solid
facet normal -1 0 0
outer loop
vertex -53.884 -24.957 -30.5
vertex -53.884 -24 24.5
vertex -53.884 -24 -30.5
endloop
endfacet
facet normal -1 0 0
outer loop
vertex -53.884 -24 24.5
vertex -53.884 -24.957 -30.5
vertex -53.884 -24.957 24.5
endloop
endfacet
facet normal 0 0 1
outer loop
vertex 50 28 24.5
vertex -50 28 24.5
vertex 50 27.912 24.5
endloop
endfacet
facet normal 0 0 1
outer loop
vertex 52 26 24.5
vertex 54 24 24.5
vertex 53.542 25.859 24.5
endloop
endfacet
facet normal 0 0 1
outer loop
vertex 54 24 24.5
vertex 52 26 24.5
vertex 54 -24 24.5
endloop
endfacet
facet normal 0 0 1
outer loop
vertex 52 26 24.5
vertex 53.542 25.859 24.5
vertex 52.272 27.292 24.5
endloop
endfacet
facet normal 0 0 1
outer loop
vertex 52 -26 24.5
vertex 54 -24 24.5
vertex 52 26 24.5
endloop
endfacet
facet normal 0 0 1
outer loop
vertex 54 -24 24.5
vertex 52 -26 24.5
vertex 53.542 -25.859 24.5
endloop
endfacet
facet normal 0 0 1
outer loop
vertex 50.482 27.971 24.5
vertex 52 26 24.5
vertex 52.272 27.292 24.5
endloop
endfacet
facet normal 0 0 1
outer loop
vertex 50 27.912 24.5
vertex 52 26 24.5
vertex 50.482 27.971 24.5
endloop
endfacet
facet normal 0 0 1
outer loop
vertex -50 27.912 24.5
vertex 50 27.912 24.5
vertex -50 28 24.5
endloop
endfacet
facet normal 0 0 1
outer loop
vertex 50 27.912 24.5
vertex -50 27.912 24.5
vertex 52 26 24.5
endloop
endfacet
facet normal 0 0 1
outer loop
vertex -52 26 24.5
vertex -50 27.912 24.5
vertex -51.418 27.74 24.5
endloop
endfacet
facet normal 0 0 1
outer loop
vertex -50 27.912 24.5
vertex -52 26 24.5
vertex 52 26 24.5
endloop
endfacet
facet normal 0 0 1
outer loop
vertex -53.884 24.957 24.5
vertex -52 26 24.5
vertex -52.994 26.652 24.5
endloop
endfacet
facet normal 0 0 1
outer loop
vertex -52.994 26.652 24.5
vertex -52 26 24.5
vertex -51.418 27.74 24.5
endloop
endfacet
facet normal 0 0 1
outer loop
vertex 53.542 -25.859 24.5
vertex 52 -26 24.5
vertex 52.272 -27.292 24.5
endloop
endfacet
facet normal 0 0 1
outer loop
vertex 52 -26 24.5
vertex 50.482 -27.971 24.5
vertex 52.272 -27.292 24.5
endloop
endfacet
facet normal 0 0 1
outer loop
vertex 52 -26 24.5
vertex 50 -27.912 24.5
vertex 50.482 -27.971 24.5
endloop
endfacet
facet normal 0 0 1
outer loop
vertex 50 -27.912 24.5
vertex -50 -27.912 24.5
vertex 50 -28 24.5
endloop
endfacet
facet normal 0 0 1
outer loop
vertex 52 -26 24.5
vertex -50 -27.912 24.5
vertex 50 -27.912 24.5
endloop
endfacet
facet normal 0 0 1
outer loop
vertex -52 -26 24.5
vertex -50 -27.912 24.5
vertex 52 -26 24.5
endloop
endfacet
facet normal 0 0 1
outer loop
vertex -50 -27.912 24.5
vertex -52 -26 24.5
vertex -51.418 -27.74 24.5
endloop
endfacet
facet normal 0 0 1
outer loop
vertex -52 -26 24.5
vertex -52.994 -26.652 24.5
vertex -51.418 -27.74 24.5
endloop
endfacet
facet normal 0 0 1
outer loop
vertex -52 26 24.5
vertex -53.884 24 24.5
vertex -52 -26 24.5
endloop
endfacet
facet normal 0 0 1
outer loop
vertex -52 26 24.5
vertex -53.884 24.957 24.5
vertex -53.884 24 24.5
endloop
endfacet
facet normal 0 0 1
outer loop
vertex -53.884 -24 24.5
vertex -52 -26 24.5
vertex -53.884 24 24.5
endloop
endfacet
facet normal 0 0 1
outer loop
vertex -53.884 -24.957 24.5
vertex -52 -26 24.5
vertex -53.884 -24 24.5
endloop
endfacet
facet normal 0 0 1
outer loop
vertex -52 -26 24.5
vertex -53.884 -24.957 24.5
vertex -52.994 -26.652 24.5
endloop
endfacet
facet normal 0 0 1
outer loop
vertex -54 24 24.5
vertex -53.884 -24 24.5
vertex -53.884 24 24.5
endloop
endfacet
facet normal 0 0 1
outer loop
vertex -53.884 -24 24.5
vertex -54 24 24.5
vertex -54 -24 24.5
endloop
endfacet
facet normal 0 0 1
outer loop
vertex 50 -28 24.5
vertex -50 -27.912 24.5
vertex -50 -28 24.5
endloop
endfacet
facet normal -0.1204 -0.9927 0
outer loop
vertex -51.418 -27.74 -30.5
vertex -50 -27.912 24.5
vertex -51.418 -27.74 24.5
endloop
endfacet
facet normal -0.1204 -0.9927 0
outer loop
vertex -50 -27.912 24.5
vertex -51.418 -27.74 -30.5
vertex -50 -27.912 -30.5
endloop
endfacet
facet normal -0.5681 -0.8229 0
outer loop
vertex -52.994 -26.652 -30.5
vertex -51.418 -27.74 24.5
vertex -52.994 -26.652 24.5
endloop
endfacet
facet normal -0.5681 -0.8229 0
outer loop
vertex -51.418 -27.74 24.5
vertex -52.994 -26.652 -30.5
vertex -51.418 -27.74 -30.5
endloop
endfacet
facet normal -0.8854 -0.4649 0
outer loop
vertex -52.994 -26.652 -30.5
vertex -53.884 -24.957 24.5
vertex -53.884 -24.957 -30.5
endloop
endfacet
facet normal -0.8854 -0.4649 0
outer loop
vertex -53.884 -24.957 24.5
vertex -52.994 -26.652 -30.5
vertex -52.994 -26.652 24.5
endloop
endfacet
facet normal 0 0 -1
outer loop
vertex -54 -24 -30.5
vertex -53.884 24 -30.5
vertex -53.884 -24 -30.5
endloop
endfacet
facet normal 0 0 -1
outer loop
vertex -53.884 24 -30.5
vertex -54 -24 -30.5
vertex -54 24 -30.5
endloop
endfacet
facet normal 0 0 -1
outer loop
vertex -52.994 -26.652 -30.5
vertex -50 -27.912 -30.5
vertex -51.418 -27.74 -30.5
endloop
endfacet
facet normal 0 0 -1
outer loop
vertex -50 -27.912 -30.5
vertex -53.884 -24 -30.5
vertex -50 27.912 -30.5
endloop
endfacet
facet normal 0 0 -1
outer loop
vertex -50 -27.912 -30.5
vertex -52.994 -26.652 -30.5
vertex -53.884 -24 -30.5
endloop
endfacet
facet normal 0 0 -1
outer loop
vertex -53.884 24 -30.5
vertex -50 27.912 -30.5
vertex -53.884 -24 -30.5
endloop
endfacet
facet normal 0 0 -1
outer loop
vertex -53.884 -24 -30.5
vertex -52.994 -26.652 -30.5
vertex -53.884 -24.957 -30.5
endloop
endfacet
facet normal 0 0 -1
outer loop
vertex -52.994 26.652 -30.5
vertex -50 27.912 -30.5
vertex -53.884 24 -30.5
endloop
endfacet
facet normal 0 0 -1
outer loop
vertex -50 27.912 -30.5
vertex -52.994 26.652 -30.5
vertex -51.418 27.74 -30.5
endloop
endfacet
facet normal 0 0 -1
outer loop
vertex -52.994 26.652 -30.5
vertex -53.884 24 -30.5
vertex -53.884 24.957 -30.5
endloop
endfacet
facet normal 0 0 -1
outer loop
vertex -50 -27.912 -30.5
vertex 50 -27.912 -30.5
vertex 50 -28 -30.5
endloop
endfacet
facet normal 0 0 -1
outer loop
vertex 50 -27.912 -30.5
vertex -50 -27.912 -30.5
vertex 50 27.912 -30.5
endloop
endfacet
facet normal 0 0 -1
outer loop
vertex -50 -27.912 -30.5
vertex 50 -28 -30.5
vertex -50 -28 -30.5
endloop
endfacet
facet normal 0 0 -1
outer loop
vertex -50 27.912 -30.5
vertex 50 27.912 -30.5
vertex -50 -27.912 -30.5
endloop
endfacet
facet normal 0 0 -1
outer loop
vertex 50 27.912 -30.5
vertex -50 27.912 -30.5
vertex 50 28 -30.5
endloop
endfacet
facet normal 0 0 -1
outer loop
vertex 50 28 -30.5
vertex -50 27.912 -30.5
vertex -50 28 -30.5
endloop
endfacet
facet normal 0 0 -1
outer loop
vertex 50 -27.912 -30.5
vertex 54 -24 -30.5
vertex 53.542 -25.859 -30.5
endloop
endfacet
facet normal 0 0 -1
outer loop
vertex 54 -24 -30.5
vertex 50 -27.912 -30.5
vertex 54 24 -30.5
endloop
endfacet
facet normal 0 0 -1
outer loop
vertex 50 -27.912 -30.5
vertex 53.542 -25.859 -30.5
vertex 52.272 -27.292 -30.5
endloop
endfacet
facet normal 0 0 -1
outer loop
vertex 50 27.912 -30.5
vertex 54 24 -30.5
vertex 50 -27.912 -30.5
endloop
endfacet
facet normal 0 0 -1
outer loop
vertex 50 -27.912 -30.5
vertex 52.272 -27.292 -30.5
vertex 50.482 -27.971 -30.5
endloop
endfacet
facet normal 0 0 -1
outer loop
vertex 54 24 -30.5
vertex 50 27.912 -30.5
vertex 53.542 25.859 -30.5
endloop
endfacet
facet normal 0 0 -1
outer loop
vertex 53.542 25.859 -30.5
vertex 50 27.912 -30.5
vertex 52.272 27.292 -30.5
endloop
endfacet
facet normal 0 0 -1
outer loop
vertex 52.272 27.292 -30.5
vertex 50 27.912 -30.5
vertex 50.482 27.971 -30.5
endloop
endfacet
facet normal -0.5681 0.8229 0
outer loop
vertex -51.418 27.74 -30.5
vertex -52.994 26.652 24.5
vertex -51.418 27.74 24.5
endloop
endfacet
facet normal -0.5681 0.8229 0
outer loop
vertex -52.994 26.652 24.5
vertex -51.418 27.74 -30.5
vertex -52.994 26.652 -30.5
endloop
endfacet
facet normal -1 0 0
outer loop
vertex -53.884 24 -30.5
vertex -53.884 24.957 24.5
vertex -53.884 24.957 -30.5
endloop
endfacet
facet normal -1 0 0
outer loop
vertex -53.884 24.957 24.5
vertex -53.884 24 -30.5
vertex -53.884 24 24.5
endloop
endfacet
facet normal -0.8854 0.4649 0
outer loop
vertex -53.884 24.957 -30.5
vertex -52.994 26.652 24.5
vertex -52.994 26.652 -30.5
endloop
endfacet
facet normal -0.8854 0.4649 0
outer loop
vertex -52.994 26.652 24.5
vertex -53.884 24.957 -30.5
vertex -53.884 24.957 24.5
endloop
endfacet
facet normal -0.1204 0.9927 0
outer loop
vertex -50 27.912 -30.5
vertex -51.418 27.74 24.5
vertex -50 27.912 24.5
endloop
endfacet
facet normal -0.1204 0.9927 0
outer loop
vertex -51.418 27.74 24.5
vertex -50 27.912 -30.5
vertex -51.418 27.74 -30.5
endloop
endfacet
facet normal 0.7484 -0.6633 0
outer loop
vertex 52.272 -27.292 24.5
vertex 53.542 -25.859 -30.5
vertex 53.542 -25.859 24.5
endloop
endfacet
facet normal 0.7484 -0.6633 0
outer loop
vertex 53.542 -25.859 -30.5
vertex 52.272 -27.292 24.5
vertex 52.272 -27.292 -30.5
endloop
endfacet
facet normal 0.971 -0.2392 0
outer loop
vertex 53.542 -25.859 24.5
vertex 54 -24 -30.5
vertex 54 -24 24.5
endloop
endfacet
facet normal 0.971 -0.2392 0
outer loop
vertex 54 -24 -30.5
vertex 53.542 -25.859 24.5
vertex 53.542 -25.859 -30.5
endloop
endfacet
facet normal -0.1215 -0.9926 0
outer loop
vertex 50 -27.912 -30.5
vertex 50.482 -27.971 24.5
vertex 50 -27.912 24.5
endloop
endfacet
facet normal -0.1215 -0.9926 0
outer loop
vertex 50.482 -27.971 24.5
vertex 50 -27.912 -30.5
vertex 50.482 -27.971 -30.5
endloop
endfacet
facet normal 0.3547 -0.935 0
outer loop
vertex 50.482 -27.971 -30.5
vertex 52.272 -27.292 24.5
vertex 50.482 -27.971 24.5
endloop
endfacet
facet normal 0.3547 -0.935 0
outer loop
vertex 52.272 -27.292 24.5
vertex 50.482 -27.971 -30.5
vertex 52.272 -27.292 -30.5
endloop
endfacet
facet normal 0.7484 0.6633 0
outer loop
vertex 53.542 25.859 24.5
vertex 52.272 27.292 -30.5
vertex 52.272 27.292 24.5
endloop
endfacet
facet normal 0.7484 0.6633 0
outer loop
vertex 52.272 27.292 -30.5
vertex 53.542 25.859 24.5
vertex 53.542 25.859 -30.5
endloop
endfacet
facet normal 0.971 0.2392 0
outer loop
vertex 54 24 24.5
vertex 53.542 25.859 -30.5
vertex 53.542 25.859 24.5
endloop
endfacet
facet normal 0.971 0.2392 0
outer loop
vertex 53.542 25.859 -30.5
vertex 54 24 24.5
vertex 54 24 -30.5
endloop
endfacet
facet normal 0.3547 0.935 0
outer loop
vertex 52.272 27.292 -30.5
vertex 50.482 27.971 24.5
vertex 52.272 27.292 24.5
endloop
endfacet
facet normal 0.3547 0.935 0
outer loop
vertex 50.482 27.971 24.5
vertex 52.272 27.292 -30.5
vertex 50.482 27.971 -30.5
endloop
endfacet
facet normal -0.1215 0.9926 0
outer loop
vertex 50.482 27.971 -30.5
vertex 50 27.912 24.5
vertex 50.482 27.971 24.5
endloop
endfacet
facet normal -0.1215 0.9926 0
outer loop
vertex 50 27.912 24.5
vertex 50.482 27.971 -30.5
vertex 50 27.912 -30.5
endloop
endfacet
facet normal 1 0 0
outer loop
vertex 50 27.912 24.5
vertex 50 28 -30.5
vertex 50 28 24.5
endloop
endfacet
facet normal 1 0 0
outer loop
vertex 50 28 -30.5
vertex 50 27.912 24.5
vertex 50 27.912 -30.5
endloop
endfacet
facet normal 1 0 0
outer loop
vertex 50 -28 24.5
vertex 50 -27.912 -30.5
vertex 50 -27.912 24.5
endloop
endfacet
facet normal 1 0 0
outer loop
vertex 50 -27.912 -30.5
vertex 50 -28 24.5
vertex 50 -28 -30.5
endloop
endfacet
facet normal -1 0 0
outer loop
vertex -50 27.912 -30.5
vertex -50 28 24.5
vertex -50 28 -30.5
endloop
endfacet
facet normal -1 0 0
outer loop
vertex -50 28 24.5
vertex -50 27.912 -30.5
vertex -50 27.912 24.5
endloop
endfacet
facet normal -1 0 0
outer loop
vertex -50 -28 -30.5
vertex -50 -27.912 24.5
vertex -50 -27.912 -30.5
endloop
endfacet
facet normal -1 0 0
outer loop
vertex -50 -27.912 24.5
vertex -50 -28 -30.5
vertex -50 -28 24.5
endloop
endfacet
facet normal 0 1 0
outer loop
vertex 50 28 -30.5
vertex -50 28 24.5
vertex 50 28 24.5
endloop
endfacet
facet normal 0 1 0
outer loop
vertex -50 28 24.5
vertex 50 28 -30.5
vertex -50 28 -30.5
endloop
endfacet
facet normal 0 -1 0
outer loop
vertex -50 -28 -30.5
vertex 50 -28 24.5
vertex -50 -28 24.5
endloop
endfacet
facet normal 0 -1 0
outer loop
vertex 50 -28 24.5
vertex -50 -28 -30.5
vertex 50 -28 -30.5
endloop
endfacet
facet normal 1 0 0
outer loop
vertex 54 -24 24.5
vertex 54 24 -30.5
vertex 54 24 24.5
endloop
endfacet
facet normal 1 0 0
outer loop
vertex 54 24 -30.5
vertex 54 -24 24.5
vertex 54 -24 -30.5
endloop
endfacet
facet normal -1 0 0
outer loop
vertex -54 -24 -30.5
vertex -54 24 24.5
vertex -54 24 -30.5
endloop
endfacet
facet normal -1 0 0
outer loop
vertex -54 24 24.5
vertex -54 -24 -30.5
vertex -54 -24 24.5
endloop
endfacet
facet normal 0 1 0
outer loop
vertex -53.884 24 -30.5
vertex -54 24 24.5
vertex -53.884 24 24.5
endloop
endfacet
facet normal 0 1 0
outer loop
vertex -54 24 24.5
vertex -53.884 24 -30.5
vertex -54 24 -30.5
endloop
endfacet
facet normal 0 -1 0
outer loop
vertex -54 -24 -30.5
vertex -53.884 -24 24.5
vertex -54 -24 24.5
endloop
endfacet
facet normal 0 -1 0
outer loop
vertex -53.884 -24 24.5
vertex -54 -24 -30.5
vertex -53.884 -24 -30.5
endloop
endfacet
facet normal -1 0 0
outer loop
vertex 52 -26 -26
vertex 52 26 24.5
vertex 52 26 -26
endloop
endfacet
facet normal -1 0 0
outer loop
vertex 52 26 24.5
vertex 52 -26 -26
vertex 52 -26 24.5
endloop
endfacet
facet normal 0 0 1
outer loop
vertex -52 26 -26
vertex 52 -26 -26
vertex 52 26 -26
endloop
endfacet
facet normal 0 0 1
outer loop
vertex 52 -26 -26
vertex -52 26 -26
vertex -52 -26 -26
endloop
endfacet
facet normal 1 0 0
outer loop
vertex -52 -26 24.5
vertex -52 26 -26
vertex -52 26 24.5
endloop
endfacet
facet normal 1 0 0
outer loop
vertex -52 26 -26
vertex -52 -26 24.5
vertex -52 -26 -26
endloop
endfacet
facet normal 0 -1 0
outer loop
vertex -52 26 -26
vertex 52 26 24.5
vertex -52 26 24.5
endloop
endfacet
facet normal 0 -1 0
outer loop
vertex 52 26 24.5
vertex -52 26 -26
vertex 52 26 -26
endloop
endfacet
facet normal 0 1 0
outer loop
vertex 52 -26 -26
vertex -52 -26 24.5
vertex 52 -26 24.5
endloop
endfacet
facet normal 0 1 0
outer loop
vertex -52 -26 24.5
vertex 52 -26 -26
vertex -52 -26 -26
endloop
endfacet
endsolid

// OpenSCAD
use <MCAD/boxes.scad>

// c bat radius & width (+ printer slop)
r=26;
w=52;
count = 4;
stack = 2;
walls = 2;
base  = 3;


difference() {
    translate([0,0,-(base)])
        roundedBox(size=[count*r+walls*2, w+walls*2, stack*r+base],radius=4, sidesonly=true);
    cube([count*r, w, stack*r], center=true);
}
